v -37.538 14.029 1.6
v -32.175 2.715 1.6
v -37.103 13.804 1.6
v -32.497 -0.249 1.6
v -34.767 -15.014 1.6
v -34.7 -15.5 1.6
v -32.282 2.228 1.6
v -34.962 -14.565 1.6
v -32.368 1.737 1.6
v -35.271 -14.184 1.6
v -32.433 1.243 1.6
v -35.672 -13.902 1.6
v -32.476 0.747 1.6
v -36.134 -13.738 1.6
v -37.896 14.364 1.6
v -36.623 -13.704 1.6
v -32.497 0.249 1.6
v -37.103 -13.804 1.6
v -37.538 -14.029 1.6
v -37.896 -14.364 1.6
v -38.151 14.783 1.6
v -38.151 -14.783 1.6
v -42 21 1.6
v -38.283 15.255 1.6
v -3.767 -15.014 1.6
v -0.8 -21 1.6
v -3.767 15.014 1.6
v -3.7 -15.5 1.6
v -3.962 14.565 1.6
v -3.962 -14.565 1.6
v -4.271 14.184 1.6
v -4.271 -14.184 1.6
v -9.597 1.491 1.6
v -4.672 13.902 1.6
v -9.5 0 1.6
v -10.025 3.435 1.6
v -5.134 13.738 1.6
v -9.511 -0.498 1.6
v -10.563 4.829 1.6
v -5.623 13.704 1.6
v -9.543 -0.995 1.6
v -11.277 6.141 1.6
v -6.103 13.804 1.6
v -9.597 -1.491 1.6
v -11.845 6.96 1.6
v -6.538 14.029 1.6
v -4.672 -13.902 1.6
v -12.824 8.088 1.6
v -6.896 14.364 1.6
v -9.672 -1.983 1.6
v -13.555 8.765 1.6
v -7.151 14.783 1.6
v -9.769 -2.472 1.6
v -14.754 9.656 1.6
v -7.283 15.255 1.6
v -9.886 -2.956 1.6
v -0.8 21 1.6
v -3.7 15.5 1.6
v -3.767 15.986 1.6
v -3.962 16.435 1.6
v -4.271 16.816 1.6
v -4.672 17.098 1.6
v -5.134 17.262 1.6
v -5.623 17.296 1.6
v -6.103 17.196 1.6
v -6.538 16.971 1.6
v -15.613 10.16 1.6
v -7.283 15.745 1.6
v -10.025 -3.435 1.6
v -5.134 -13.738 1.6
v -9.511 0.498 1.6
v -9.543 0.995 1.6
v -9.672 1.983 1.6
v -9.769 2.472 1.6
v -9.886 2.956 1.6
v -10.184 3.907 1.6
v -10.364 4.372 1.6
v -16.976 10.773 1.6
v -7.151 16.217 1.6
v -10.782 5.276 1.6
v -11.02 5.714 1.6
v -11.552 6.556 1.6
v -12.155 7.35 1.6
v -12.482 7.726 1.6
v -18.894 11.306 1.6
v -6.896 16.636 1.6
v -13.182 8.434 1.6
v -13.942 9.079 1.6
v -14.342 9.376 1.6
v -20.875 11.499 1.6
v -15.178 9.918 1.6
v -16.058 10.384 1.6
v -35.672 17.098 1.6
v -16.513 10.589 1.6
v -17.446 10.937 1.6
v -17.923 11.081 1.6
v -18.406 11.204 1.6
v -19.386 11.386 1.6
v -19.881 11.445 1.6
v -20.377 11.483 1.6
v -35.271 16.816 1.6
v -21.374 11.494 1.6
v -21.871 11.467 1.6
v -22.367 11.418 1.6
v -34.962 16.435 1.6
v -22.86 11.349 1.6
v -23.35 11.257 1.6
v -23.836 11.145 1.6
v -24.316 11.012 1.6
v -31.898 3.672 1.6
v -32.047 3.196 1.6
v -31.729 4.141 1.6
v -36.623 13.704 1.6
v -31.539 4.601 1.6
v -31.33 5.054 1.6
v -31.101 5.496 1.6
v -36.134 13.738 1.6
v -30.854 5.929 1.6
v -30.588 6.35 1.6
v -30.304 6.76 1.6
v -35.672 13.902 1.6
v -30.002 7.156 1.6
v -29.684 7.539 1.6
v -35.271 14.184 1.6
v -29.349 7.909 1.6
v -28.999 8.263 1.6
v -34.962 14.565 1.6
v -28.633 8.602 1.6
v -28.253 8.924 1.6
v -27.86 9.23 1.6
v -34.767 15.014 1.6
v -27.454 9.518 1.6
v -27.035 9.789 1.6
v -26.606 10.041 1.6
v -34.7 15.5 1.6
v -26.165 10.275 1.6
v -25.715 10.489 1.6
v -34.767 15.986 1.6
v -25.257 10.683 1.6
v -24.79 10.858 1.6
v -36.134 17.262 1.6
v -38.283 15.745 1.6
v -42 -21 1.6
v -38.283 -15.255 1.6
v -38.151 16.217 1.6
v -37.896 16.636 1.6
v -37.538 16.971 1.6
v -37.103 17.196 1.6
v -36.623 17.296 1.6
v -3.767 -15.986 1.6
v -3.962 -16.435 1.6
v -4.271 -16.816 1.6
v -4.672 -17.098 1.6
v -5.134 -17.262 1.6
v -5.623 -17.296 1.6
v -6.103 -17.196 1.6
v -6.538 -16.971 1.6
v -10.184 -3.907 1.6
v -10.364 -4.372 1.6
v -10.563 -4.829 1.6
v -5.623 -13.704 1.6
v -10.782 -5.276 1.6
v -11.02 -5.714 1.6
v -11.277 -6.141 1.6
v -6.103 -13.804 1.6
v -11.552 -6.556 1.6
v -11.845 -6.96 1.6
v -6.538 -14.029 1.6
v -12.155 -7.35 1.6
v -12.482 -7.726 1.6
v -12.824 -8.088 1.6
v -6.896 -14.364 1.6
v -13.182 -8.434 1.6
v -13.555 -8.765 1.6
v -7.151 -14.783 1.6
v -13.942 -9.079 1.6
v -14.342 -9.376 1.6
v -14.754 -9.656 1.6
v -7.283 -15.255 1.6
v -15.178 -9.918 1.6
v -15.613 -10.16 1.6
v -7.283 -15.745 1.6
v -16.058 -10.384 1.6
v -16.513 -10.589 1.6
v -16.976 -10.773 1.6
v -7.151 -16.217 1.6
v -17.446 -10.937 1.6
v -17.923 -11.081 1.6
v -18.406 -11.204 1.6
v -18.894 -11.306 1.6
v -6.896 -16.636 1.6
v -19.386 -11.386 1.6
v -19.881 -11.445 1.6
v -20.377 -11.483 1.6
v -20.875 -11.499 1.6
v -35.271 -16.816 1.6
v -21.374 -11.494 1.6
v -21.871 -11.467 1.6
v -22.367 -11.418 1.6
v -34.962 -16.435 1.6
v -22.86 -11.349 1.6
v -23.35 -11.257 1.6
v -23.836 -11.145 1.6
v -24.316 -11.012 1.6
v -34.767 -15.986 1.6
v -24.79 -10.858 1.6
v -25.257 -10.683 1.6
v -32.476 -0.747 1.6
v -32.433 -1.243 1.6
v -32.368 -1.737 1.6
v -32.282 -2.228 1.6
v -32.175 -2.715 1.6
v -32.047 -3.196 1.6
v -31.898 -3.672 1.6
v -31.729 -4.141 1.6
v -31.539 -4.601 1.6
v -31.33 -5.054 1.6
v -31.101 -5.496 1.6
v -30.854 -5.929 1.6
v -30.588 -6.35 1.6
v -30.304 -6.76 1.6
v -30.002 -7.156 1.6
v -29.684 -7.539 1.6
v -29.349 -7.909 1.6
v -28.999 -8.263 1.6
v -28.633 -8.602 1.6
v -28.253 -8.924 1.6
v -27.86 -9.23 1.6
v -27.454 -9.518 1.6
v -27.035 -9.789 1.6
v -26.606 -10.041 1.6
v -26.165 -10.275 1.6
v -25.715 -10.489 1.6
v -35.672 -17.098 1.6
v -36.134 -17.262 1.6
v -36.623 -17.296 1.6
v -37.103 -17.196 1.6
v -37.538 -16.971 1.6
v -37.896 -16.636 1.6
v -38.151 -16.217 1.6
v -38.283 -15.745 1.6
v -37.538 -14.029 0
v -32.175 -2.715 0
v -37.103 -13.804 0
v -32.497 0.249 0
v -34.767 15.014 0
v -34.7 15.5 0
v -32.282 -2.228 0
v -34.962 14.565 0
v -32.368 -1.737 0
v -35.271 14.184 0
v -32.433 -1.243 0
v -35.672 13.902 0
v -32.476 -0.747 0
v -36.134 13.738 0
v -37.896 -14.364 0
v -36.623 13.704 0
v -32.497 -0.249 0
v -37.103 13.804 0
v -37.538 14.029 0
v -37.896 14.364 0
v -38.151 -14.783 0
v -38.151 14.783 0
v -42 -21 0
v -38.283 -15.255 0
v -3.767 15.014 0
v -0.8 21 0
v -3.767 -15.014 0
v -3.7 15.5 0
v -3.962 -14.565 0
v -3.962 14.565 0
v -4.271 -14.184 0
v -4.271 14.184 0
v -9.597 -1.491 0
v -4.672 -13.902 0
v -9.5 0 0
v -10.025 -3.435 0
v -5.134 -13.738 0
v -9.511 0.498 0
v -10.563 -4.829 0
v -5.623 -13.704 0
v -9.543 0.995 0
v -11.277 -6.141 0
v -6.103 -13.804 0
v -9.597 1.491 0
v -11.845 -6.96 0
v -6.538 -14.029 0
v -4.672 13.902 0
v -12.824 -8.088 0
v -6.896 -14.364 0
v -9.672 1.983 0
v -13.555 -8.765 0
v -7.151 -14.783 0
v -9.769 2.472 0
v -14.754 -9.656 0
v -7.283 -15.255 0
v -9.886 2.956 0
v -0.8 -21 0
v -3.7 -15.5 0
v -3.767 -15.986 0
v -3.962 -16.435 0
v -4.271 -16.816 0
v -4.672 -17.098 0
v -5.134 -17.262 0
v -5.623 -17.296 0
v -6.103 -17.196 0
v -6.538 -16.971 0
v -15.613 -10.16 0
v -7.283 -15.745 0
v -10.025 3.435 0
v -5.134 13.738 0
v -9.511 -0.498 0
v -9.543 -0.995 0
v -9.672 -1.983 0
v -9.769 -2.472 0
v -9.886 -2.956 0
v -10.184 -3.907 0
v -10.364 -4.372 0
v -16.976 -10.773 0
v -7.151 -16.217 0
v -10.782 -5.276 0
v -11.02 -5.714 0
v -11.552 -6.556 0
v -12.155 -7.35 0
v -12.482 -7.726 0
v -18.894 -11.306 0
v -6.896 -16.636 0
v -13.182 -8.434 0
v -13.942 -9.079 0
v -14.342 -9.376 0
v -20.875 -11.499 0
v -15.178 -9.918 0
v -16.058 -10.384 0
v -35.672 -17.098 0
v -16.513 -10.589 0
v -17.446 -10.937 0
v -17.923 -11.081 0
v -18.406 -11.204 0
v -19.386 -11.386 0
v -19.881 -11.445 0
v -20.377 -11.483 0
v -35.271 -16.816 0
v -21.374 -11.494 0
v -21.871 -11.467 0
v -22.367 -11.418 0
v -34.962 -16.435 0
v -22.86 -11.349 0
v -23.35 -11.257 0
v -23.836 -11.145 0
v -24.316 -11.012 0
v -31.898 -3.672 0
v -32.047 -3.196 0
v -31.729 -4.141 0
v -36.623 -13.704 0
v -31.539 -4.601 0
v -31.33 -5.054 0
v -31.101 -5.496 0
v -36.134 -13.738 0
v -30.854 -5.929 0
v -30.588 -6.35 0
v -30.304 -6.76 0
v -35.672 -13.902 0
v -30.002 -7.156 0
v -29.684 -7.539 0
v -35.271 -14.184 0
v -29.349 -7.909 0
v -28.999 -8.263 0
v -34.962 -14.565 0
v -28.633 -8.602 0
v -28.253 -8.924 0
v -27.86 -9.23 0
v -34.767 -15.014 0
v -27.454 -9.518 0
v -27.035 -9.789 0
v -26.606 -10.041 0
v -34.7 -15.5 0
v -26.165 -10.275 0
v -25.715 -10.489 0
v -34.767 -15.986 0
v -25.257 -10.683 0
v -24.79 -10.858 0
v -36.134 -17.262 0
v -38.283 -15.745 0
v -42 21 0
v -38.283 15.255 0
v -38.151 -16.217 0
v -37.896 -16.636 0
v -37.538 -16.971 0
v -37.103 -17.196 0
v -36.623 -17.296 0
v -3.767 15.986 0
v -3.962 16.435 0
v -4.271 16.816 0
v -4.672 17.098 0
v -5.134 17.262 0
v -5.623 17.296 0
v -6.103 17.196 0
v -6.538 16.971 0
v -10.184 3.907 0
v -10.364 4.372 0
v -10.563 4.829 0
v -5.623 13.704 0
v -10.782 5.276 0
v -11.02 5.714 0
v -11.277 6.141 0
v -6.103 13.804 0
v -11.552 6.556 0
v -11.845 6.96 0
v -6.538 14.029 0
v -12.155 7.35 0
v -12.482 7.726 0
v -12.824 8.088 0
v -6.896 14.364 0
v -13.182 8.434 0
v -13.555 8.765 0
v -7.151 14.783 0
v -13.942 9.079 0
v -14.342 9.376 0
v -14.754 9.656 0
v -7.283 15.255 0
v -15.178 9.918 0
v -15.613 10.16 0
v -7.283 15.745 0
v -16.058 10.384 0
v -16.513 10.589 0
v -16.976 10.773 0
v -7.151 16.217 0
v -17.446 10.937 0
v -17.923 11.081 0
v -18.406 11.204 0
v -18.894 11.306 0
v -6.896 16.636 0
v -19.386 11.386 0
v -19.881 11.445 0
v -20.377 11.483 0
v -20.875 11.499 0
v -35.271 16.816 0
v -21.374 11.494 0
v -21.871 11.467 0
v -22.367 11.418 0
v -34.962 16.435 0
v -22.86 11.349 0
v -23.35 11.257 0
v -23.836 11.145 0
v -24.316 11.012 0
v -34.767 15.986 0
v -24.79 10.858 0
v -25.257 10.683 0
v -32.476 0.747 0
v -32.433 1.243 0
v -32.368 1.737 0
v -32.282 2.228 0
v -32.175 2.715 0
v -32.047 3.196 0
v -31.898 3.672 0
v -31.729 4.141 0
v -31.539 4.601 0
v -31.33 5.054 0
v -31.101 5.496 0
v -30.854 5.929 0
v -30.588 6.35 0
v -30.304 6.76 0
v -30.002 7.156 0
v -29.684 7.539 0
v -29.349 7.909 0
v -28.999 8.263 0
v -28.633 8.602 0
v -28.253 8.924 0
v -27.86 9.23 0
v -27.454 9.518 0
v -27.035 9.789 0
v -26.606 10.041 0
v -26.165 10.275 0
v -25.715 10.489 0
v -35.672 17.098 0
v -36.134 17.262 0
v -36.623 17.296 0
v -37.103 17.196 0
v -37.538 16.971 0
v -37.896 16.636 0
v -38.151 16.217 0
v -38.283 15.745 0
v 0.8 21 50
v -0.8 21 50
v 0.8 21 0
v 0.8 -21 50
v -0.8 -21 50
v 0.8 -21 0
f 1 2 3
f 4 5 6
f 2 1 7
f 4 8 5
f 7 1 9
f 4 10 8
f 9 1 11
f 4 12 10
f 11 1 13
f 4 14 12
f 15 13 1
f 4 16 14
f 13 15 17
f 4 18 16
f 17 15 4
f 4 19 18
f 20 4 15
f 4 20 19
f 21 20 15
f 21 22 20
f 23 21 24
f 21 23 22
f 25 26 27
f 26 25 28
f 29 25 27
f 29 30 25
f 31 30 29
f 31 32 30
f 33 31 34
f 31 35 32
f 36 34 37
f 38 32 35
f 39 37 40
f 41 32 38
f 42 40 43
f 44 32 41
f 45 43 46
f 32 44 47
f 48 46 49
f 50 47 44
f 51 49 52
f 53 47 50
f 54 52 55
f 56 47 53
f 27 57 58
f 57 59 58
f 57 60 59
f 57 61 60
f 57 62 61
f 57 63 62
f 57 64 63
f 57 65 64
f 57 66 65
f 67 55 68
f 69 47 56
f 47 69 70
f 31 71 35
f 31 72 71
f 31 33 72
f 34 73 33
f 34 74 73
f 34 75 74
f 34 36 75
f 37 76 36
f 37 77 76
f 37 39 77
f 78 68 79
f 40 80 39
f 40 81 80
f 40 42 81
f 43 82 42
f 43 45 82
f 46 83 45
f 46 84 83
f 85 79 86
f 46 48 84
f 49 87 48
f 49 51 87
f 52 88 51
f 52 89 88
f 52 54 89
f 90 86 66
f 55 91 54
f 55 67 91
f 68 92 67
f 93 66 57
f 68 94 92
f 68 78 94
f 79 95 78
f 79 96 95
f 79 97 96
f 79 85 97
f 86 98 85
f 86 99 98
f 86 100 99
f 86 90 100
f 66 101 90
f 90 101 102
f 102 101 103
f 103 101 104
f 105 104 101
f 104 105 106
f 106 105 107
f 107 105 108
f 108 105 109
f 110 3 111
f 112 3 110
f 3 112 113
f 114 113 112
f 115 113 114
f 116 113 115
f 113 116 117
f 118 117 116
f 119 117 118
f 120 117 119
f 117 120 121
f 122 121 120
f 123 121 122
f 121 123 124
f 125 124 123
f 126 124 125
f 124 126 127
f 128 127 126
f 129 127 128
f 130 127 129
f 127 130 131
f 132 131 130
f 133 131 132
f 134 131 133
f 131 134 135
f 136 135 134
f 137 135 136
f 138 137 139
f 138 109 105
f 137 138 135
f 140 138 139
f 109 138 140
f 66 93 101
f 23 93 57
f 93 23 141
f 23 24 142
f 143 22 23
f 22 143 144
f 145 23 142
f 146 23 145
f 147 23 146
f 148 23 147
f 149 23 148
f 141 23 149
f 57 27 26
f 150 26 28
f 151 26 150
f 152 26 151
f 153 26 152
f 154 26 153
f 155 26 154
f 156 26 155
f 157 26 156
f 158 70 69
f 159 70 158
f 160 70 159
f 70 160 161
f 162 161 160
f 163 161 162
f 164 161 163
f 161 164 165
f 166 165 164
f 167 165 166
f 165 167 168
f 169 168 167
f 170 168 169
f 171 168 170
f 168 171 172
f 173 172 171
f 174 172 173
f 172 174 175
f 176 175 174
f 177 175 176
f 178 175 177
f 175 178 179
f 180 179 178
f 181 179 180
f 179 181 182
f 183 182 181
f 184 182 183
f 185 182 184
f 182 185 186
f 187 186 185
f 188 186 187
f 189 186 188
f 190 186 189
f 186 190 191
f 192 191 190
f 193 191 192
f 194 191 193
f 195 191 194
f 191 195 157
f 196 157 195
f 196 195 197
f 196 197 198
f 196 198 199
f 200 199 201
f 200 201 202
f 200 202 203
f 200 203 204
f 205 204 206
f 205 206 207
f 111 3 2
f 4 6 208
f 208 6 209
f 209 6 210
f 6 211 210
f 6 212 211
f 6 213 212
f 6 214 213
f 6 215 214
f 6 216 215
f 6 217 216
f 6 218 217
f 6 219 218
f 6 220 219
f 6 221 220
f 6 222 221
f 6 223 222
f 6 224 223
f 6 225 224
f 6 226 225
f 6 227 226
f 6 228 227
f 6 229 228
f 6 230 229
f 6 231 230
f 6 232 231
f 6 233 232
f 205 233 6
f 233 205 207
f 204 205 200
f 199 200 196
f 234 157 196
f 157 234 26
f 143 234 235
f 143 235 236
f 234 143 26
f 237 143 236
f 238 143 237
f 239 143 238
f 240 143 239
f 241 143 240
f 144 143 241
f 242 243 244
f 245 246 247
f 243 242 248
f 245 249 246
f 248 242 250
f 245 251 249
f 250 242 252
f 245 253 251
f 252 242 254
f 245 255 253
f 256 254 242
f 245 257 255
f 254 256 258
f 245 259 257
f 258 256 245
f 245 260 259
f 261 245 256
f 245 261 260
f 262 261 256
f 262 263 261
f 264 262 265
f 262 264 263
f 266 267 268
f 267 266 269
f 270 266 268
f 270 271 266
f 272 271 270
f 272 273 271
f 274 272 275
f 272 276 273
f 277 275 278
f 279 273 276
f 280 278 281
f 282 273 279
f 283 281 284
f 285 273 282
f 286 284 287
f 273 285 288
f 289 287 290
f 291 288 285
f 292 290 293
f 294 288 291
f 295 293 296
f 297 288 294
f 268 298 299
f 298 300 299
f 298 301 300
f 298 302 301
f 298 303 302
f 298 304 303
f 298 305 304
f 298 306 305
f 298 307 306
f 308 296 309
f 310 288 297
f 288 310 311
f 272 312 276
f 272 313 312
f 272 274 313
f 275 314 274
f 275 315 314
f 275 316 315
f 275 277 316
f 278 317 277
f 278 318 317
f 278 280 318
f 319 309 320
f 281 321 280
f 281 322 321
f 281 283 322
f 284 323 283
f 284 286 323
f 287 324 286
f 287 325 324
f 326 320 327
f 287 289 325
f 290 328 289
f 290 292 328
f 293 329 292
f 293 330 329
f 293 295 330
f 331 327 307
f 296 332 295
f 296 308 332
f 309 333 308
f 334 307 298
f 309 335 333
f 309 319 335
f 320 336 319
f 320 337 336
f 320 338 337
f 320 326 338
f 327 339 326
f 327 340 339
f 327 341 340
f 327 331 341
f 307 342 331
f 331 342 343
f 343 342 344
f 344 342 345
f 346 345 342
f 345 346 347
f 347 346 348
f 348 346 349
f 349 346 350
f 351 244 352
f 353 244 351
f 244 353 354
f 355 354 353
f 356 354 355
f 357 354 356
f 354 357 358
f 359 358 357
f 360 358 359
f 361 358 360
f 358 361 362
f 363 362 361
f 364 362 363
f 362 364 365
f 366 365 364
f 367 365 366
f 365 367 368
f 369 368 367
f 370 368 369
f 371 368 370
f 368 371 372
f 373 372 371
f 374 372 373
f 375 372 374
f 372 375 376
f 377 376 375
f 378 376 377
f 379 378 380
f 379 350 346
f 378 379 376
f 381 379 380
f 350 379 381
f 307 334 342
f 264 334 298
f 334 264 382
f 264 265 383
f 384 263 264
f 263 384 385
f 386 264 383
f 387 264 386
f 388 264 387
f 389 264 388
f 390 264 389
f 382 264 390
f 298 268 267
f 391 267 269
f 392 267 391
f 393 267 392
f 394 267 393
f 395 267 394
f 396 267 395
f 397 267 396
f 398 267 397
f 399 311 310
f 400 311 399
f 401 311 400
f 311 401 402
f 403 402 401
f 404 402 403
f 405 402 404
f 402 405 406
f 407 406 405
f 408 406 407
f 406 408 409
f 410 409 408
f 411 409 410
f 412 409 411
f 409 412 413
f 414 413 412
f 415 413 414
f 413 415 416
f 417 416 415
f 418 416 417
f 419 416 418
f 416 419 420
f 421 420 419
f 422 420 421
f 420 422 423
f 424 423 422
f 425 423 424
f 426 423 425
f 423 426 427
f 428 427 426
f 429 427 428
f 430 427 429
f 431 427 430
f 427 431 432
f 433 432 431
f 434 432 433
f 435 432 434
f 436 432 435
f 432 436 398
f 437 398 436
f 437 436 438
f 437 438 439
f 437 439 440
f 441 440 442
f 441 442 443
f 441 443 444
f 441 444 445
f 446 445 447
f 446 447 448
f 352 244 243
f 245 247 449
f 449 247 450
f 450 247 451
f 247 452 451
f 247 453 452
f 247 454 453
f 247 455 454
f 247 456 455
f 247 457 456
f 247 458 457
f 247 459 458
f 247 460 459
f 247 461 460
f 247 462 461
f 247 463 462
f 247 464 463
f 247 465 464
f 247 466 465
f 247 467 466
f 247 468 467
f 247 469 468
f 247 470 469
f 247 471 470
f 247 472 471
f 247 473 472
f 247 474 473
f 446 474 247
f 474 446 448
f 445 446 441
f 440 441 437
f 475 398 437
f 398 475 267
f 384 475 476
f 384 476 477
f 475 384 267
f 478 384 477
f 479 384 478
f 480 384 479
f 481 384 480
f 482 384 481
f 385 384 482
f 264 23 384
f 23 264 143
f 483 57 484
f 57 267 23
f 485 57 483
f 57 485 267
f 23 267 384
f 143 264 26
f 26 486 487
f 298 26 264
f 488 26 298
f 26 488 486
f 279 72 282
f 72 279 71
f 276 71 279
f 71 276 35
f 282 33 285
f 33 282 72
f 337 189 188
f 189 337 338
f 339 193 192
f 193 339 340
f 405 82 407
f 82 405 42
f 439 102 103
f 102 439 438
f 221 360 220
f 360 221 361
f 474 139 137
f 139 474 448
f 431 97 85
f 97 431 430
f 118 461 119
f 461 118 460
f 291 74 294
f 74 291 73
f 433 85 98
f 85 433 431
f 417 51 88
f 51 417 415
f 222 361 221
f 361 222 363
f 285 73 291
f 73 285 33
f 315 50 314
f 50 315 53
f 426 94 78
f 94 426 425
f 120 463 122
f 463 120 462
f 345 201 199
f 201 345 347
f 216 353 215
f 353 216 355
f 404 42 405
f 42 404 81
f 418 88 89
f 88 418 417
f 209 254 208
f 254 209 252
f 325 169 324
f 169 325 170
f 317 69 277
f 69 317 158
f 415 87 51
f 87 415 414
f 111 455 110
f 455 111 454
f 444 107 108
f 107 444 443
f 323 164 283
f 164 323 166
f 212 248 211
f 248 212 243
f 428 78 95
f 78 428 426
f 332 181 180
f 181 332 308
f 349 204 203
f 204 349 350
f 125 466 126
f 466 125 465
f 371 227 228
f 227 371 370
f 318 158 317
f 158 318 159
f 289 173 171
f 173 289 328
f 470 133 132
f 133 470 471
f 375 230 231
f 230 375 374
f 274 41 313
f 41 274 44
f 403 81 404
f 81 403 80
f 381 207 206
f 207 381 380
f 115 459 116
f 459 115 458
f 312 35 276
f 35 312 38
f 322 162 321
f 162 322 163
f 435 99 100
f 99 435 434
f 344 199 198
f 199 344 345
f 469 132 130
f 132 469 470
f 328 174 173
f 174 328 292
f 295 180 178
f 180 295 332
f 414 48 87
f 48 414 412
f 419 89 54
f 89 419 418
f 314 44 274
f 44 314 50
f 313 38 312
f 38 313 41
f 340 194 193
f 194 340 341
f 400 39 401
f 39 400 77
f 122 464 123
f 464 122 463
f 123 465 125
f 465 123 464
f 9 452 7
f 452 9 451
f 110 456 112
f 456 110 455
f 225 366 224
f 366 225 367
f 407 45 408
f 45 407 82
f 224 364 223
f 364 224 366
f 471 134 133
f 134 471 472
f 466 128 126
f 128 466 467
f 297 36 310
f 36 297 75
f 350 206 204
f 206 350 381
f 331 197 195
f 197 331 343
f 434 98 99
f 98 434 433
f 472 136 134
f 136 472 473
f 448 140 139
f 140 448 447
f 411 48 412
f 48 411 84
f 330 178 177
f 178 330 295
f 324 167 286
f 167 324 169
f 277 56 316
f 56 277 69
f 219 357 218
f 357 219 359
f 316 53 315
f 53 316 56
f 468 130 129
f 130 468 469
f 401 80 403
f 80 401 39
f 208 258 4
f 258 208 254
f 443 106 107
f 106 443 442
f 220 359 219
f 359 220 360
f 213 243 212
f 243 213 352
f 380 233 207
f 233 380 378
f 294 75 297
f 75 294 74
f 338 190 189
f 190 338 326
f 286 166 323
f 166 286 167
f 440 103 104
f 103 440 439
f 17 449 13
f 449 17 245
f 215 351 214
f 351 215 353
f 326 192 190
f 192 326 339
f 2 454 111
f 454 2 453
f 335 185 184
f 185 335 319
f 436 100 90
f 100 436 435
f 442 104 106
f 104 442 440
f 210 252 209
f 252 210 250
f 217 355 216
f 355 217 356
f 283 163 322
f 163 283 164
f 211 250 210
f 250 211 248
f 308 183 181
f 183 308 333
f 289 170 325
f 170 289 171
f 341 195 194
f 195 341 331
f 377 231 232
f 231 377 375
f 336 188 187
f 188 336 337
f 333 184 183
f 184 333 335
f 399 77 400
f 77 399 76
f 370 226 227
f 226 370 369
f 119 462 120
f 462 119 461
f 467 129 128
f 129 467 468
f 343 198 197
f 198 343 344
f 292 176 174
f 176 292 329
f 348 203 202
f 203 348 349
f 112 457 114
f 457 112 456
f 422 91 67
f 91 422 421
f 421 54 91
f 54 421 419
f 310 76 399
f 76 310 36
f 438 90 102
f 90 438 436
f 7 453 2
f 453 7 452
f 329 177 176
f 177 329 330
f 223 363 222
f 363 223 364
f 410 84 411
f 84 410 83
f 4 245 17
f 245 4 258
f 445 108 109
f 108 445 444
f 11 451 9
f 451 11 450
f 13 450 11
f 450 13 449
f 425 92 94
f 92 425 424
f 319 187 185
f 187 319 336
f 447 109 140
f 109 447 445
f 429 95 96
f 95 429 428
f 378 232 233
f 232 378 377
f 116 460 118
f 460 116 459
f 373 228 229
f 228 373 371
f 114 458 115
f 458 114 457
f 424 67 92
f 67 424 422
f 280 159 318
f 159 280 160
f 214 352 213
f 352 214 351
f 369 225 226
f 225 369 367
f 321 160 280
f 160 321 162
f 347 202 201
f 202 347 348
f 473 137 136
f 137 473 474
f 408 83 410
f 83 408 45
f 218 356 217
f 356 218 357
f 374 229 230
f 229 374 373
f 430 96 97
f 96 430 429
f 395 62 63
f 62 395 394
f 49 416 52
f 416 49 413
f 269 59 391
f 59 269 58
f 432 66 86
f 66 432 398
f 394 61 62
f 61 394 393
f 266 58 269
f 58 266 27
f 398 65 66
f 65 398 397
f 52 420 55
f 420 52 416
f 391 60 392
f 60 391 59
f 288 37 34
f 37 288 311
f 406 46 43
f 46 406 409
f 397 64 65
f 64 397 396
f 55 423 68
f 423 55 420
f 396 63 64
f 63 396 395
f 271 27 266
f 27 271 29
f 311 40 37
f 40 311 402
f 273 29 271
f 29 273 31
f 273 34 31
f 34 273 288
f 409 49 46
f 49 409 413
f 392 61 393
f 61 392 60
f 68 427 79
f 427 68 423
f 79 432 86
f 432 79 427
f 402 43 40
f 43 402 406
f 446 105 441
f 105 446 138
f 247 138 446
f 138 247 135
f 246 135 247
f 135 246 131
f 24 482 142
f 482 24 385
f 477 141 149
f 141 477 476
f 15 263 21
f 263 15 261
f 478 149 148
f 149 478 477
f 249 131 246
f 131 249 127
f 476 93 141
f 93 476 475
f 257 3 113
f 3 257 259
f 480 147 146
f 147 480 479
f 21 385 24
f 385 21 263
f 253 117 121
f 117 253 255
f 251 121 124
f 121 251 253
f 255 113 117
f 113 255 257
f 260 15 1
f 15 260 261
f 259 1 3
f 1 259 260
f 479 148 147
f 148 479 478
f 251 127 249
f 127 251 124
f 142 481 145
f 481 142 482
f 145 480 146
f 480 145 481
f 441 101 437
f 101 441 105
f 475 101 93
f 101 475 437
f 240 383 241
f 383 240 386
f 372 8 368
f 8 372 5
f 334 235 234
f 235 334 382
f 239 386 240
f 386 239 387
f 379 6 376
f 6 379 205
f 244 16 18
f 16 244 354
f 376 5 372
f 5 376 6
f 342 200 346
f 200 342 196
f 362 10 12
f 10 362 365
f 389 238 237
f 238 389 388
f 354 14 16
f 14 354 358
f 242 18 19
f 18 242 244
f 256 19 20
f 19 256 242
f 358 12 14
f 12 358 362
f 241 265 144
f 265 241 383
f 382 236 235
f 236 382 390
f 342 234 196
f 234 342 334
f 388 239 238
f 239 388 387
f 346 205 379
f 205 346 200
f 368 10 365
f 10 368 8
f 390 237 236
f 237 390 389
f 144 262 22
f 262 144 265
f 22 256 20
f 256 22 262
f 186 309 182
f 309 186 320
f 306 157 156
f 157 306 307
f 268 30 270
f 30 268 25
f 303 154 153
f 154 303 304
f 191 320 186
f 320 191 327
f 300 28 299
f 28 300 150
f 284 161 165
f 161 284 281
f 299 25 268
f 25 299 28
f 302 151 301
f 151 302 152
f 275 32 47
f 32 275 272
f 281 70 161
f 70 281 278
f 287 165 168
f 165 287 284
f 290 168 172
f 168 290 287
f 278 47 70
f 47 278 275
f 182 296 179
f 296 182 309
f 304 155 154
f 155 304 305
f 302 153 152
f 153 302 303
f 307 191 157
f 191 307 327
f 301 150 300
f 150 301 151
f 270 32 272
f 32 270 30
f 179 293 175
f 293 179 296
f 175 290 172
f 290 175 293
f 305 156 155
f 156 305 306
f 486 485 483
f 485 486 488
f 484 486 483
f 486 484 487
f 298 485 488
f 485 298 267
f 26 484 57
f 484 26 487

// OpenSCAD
// [FL_INDEX: keywords="openscad, 3d_parametric, Customizable_Clamp_Mount_for_NEMA_17_Stepper, csg_solid" | COT="Parametric OpenSCAD design from 3DCodeverse"]
// Title: Customizable Clamp Mount for NEMA 17 Stepper

//design and code by emanresu (http://www.thingiverse.com/Emanresu)
//generates clampable mounts for a NEMA 17 syle stepper motor



//CUSTOMIZER VARIABLES

//Clamp Type
type = "90 degree";//[90 degree, 180 degree, 45 degree, Multi]
//Clamp Thickness (mm)
thick = 1.6;
//Shaft height (mm)
shaft_height = 21;// 21:10000000
//width of clamp base (mm);
width=42; //42:10000000
//do you want the motor plate the same width as the clamp?
mount_flush="yes";//[yes,no]
//how do you want the motor mount justified with respect to the clamp?
//length of 90º base of clamp (mm)
base_1 = 50;
//length of 180º or 45º base of clamp (mm)
base_2 = 30;
//length of 180º base in multi-clamp (mm)
base_3 = 30;


/* [Hidden] */

//Sets openSCAD resolution for nice round holes
$fa=1;
$fs=0.5;

//NEMA 17 Parameters
Nema_square = 42;
Nema_hole_offset = 31;
Nema_mount_hole_diameter = 3.6;//clearance for M3 screws
Nema_center_hole_diameter = 23;

Nema_mount_hole_radius = Nema_mount_hole_diameter/2;
Nema_center_hole_radius = Nema_center_hole_diameter/2;


   ///////////////
  //  Modules  //
 ///////////////

module NEMA17_plate() {
	// Generates mounting plate  with the necessary clearance holes for a NEMA 17 style motor
	
	difference() {
		//plate body
		cube(size=[Nema_square, Nema_square, thick], center=true);
		
		//center hole
		cylinder(r=Nema_center_hole_radius, h=thick+2, center=true);
		
		//clearance holes for M3 screws
		translate([Nema_hole_offset/2, Nema_hole_offset/2, 0]) {
			cylinder(r=Nema_mount_hole_radius, h=thick+1, center=true);
		} 
		translate([-Nema_hole_offset/2, Nema_hole_offset/2, 0]) {
			cylinder(r=Nema_mount_hole_radius, h=thick+1, center=true);
		}
		translate([-Nema_hole_offset/2, -Nema_hole_offset/2, 0]) {
			cylinder(r=Nema_mount_hole_radius, h=thick+1, center=true);
		}
		translate([Nema_hole_offset/2, -Nema_hole_offset/2, 0]) {
			cylinder(r=Nema_mount_hole_radius, h=thick+1, center=true);
		}
	}
}


module 90deg_clamp() {
	// makes a simple 90º clamp for a NEMA 17 style motor
	
	//defines spacer for shaft_height parameter
	//sets minimum value allowed for shaft height
	delta = (shaft_height >= 21 ? abs(shaft_height-Nema_square/2) : 0);
	
	//sets minimum value allowed for the base width
	base_width = (width - Nema_square > 0 ? width : Nema_square);
	
	//determines if mount plate is flush with the rest of the clamp
	test_width = (mount_flush == "yes" ? (abs(width-Nema_square)/2) : 0);
	ex_width = (width-Nema_square > 0 ? test_width : 0);

	union() {
		//joining the parts of the clamp together
		translate([-21-delta, 0, thick/2]) {
			//positions motor mount
			NEMA17_plate();
		}
		translate([-delta/2, 0, thick/2]) {
			//spacer for motor height
			cube(size=[delta, 42, thick], center=true);
		}
		translate([-(42+delta)/2, 21+ex_width/2, thick/2]) {
			//wings for making plate flush
			cube(size=[42+delta, ex_width, thick], center=true);
		}
		translate([-(42+delta)/2, -21-ex_width/2, thick/2]) {
			//wings for making plate flush
			cube(size=[42+delta, ex_width, thick], center=true);
		}
		translate([0, 0, base_1/2]) {
			//90º clamp base
			cube(size=[thick, base_width, base_1], center=true);
		}
	}
}


module 180deg_clamp() {
	// makes a simple 180º clamp for a NEMA 17 style motor
	
	union() {
		//joins 90º clamp with an additional base to make the 180º clamp
		translate([-base_1-thick/2, 0, thick/2]) {
			rotate([0, 90, 0]) {
				//reorients the 90º clamp so the 180º clamp is printable
				90deg_clamp();
			}
		}
		translate([0, 0, base_2/2]) {
			//adding the 180º base to the clamp
			cube(size=[thick, width, base_2], center=true);
		}
	}	
}


module 45deg_clamp() {
	// makes a simple 45º clamp for a NEMA 17 style motor
	
	translate([0, 0, width/2]) rotate([-90, 0, 0]) {
		//Positions clamp for printing
		union() {
			//joins 90º clamp with an additional base to make the 45º clamp
			translate([-base_1, 0, thick/2]) {
				rotate([0, 90, 0]) {
					90deg_clamp();
				}
			}
			rotate([0, -45, 0]) {
				//adding the 45º base to the clamp
				translate([base_2/2, 0, thick/2]) {
					cube(size=[base_2, width, thick], center=true);
				}
			}	
		}
	}	
}


module Multi_clamp() {
	// makes a multi clamp (one with 45º, 90º and 180º clamping surfaces) for a NEMA 17 style motor
	
	beta = base_2*sin(45);
	
	union() {
		//joins a 45º clamp with an additional base to make the multi clamp
		45deg_clamp();

		translate([beta-thick, beta, 0]) {
			//adding the 180º base to the multi-clamp
			cube(size=[thick, base_3, width], center=false);
		}
	}	
}


   ////////////////////
  //  Control Code  //
 ////////////////////



if (type == "90 degree") {
	90deg_clamp();
}
if (type == "45 degree") {
	45deg_clamp();
}
if (type == "180 degree") {
	180deg_clamp();
}
if (type == "Multi") {
	Multi_clamp();
}
 
